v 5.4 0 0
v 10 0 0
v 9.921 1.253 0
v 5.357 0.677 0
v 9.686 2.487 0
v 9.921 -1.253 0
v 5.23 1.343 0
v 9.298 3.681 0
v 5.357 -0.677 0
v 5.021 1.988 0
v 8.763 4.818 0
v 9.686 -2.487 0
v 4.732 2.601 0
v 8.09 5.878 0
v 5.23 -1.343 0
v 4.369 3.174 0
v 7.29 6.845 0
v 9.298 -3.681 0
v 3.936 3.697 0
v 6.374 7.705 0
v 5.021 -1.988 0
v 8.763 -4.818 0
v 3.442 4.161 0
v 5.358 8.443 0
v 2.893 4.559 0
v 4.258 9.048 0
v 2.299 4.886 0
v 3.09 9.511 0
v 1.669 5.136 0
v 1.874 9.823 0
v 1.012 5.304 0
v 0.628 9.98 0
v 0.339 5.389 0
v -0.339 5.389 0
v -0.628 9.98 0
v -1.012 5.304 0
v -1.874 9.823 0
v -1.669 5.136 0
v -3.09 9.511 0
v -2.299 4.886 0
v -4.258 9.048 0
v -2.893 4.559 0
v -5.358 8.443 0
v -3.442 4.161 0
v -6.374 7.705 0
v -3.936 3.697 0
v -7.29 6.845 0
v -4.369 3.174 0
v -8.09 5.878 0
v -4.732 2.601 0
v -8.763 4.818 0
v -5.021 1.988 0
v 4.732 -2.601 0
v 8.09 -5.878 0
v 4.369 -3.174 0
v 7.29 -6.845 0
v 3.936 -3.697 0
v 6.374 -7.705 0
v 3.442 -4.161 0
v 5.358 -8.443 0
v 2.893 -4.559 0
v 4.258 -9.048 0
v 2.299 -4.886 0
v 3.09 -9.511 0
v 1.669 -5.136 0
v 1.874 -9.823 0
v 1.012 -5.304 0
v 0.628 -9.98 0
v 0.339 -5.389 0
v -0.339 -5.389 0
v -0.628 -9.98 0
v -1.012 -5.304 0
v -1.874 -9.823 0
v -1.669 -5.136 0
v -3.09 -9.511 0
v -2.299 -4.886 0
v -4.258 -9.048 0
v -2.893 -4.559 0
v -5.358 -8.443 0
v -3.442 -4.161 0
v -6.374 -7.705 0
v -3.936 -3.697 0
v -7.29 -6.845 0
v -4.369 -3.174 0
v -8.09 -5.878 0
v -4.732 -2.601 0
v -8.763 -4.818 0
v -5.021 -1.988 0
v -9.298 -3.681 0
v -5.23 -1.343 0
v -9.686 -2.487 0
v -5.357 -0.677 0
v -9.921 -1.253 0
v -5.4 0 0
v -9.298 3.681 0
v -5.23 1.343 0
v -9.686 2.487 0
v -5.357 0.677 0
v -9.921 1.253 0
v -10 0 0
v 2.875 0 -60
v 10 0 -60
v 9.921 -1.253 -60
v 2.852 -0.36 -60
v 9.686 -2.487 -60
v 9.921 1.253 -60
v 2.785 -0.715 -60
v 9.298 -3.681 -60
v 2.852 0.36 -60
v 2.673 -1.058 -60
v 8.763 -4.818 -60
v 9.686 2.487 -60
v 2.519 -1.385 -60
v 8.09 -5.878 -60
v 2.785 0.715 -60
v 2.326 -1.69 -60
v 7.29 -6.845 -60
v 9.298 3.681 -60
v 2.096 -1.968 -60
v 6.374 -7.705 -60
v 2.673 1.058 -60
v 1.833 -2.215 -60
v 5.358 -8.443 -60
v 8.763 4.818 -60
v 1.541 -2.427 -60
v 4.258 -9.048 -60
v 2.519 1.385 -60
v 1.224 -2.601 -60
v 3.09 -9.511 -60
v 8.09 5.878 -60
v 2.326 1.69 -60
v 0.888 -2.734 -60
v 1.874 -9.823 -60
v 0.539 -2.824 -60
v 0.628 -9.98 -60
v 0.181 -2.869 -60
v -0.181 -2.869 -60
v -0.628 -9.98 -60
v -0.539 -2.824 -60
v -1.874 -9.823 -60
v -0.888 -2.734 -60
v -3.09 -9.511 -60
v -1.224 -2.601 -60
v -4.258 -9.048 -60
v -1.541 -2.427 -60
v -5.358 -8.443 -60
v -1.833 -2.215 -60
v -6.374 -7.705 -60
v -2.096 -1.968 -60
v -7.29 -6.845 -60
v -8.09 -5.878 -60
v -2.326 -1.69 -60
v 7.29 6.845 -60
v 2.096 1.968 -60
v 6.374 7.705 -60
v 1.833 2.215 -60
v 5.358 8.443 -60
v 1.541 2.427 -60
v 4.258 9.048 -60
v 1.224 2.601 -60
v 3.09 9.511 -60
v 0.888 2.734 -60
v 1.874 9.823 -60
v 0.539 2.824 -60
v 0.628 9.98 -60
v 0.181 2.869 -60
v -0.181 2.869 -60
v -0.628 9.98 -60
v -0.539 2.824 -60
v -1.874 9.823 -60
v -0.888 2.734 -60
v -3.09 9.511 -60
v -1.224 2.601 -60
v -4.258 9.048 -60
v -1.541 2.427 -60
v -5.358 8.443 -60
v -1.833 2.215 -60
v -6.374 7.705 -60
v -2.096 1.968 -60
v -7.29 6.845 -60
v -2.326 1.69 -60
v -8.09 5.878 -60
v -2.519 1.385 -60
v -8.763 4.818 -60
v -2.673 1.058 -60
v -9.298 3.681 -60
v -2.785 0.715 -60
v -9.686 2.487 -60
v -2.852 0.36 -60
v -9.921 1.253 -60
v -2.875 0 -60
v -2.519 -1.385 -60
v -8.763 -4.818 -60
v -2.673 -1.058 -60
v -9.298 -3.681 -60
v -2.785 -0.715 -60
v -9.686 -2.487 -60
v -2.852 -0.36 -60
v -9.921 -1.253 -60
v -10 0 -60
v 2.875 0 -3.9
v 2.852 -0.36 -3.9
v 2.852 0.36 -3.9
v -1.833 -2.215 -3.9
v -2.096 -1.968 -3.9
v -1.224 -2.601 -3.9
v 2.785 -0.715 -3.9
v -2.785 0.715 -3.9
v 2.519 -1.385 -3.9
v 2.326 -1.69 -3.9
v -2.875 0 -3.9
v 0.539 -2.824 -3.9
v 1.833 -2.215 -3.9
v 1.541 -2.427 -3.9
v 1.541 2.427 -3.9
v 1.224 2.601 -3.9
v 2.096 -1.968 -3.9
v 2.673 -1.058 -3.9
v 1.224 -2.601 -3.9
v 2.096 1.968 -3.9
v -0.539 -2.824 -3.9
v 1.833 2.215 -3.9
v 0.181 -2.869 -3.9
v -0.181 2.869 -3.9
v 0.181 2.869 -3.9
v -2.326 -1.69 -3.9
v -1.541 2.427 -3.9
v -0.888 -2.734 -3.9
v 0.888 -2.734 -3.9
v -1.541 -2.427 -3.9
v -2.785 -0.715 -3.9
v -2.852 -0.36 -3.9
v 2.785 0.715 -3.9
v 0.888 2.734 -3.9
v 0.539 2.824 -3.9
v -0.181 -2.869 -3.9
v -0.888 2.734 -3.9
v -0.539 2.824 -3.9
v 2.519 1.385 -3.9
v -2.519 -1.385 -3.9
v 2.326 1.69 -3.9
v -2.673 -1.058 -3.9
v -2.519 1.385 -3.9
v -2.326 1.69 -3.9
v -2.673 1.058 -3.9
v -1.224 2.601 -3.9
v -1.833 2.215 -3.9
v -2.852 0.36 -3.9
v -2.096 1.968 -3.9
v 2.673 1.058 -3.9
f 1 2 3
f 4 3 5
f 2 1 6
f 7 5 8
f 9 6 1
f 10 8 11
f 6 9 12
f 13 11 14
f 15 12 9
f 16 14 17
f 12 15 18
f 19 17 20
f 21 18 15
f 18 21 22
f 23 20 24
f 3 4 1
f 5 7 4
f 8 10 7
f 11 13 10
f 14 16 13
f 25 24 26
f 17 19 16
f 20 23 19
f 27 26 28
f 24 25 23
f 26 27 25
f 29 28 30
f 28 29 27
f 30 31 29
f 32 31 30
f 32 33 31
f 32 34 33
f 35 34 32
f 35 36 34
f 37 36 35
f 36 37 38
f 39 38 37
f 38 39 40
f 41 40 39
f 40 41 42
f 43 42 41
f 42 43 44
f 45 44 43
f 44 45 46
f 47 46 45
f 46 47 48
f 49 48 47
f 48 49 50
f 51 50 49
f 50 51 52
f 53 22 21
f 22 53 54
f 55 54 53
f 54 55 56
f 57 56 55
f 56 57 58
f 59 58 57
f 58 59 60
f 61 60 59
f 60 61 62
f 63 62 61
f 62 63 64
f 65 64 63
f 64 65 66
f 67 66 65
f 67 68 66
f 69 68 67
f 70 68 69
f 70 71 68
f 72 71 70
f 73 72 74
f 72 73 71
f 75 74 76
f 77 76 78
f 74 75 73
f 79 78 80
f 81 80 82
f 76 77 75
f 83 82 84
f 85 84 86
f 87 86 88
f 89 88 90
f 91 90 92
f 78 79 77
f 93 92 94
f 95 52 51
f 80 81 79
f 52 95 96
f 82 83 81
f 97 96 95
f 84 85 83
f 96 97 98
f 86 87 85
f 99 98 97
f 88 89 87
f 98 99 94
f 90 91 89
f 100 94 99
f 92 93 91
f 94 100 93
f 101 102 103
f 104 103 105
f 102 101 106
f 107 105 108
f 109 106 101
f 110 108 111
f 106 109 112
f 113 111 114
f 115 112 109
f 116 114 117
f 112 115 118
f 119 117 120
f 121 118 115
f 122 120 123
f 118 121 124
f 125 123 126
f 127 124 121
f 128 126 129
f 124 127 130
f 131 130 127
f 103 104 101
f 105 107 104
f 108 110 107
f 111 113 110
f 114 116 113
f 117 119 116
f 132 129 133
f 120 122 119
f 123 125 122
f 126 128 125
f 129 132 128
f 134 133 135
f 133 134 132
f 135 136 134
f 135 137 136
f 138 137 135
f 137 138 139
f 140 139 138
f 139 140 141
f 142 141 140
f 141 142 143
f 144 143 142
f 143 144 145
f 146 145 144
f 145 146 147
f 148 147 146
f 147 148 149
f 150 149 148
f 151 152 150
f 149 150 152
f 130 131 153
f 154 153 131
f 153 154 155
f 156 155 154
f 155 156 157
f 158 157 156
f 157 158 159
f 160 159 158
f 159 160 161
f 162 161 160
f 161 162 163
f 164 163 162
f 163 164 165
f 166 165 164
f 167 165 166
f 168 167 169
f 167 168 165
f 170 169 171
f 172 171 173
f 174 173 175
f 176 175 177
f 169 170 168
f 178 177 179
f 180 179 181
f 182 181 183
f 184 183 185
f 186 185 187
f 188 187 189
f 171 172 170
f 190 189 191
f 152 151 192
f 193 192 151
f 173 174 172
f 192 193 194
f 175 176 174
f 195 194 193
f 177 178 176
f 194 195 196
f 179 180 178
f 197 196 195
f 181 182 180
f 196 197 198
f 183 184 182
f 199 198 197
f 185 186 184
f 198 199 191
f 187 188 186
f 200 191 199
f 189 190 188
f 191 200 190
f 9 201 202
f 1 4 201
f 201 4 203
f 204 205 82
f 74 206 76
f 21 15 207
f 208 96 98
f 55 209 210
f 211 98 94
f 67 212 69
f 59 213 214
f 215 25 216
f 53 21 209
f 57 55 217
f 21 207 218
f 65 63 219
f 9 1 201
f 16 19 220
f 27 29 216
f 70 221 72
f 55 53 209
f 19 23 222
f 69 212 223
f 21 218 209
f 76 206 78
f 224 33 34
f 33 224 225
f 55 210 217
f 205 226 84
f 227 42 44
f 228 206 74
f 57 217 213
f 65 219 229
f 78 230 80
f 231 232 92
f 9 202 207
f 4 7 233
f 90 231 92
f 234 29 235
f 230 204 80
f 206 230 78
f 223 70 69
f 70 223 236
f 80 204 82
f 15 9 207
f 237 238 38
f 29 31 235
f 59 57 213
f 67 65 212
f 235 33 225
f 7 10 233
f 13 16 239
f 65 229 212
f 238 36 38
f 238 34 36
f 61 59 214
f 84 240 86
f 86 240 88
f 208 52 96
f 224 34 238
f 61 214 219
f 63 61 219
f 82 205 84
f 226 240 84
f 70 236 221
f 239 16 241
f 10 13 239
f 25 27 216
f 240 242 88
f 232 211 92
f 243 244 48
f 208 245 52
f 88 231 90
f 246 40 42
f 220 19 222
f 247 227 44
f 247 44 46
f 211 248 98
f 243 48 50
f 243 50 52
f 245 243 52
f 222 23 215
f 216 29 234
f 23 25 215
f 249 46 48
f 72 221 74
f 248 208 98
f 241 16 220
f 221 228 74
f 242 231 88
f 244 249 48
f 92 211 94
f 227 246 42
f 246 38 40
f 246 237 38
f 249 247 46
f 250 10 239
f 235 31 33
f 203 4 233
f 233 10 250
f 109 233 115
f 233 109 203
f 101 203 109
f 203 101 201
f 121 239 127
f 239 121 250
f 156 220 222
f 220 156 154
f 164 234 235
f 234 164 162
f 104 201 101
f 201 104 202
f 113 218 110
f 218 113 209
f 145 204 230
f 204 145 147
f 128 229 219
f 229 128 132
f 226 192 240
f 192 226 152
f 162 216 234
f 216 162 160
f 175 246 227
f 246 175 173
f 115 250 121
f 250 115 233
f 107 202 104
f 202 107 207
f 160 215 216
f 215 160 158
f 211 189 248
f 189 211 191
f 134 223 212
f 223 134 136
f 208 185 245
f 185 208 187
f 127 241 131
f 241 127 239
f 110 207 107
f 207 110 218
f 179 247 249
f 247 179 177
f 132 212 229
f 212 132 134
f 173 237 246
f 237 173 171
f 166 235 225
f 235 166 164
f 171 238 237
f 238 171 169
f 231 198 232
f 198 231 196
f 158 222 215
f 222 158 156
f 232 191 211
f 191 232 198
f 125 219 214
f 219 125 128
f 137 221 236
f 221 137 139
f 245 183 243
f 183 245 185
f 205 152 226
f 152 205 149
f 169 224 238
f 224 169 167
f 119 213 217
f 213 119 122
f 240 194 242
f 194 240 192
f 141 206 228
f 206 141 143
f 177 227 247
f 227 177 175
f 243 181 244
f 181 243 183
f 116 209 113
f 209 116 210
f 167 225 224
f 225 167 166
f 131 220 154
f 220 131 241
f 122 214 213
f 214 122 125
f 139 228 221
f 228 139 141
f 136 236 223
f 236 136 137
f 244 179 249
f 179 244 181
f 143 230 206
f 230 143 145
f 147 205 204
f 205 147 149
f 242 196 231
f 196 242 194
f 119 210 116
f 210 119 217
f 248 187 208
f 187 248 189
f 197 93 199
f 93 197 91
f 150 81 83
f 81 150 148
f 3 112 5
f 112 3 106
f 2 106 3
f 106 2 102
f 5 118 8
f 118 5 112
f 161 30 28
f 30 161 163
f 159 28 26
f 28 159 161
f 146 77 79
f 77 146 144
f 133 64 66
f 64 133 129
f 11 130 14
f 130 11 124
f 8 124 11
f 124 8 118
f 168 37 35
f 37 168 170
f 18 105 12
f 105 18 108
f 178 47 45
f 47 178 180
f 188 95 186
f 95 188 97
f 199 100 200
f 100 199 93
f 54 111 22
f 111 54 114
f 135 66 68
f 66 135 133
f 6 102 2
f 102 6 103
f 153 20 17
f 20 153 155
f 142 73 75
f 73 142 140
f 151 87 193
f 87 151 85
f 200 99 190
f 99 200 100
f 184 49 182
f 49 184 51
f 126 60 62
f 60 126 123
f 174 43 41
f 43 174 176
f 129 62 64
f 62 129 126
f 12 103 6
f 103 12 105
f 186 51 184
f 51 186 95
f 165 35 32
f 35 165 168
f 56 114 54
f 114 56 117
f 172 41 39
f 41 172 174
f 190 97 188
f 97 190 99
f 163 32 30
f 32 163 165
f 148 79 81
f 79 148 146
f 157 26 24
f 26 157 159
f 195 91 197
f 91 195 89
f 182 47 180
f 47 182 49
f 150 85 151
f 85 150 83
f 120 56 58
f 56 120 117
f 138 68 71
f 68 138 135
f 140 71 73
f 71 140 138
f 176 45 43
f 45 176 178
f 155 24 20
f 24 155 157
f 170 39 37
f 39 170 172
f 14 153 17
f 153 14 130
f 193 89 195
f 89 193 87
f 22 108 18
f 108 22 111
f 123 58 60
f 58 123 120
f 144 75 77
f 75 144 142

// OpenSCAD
$fn = 50;


difference() {
	union() {
		translate(v = [0, 0, -60.0000000000]) {
			cylinder(h = 60, r = 10.0000000000);
		}
		cylinder(h = 0, r = 13.0000000000);
	}
	union() {
		translate(v = [0, 0, 0]) {
			rotate(a = [0, 0, 0]) {
				difference() {
					union() {
						#translate(v = [0, 0, -60.0000000000]) {
							cylinder(h = 60, r = 2.6000000000);
						}
						#translate(v = [0, 0, -3.9000000000]) {
							cylinder(h = 3.9000000000, r = 10.0000000000, r1 = 2.8750000000, r2 = 5.4000000000);
						}
						#translate(v = [0, 0, -60.0000000000]) {
							cylinder(h = 60, r = 2.8750000000);
						}
						#translate(v = [0, 0, -60.0000000000]) {
							cylinder(h = 60, r = 2.6000000000);
						}
					}
					union();
				}
			}
		}
	}
}
